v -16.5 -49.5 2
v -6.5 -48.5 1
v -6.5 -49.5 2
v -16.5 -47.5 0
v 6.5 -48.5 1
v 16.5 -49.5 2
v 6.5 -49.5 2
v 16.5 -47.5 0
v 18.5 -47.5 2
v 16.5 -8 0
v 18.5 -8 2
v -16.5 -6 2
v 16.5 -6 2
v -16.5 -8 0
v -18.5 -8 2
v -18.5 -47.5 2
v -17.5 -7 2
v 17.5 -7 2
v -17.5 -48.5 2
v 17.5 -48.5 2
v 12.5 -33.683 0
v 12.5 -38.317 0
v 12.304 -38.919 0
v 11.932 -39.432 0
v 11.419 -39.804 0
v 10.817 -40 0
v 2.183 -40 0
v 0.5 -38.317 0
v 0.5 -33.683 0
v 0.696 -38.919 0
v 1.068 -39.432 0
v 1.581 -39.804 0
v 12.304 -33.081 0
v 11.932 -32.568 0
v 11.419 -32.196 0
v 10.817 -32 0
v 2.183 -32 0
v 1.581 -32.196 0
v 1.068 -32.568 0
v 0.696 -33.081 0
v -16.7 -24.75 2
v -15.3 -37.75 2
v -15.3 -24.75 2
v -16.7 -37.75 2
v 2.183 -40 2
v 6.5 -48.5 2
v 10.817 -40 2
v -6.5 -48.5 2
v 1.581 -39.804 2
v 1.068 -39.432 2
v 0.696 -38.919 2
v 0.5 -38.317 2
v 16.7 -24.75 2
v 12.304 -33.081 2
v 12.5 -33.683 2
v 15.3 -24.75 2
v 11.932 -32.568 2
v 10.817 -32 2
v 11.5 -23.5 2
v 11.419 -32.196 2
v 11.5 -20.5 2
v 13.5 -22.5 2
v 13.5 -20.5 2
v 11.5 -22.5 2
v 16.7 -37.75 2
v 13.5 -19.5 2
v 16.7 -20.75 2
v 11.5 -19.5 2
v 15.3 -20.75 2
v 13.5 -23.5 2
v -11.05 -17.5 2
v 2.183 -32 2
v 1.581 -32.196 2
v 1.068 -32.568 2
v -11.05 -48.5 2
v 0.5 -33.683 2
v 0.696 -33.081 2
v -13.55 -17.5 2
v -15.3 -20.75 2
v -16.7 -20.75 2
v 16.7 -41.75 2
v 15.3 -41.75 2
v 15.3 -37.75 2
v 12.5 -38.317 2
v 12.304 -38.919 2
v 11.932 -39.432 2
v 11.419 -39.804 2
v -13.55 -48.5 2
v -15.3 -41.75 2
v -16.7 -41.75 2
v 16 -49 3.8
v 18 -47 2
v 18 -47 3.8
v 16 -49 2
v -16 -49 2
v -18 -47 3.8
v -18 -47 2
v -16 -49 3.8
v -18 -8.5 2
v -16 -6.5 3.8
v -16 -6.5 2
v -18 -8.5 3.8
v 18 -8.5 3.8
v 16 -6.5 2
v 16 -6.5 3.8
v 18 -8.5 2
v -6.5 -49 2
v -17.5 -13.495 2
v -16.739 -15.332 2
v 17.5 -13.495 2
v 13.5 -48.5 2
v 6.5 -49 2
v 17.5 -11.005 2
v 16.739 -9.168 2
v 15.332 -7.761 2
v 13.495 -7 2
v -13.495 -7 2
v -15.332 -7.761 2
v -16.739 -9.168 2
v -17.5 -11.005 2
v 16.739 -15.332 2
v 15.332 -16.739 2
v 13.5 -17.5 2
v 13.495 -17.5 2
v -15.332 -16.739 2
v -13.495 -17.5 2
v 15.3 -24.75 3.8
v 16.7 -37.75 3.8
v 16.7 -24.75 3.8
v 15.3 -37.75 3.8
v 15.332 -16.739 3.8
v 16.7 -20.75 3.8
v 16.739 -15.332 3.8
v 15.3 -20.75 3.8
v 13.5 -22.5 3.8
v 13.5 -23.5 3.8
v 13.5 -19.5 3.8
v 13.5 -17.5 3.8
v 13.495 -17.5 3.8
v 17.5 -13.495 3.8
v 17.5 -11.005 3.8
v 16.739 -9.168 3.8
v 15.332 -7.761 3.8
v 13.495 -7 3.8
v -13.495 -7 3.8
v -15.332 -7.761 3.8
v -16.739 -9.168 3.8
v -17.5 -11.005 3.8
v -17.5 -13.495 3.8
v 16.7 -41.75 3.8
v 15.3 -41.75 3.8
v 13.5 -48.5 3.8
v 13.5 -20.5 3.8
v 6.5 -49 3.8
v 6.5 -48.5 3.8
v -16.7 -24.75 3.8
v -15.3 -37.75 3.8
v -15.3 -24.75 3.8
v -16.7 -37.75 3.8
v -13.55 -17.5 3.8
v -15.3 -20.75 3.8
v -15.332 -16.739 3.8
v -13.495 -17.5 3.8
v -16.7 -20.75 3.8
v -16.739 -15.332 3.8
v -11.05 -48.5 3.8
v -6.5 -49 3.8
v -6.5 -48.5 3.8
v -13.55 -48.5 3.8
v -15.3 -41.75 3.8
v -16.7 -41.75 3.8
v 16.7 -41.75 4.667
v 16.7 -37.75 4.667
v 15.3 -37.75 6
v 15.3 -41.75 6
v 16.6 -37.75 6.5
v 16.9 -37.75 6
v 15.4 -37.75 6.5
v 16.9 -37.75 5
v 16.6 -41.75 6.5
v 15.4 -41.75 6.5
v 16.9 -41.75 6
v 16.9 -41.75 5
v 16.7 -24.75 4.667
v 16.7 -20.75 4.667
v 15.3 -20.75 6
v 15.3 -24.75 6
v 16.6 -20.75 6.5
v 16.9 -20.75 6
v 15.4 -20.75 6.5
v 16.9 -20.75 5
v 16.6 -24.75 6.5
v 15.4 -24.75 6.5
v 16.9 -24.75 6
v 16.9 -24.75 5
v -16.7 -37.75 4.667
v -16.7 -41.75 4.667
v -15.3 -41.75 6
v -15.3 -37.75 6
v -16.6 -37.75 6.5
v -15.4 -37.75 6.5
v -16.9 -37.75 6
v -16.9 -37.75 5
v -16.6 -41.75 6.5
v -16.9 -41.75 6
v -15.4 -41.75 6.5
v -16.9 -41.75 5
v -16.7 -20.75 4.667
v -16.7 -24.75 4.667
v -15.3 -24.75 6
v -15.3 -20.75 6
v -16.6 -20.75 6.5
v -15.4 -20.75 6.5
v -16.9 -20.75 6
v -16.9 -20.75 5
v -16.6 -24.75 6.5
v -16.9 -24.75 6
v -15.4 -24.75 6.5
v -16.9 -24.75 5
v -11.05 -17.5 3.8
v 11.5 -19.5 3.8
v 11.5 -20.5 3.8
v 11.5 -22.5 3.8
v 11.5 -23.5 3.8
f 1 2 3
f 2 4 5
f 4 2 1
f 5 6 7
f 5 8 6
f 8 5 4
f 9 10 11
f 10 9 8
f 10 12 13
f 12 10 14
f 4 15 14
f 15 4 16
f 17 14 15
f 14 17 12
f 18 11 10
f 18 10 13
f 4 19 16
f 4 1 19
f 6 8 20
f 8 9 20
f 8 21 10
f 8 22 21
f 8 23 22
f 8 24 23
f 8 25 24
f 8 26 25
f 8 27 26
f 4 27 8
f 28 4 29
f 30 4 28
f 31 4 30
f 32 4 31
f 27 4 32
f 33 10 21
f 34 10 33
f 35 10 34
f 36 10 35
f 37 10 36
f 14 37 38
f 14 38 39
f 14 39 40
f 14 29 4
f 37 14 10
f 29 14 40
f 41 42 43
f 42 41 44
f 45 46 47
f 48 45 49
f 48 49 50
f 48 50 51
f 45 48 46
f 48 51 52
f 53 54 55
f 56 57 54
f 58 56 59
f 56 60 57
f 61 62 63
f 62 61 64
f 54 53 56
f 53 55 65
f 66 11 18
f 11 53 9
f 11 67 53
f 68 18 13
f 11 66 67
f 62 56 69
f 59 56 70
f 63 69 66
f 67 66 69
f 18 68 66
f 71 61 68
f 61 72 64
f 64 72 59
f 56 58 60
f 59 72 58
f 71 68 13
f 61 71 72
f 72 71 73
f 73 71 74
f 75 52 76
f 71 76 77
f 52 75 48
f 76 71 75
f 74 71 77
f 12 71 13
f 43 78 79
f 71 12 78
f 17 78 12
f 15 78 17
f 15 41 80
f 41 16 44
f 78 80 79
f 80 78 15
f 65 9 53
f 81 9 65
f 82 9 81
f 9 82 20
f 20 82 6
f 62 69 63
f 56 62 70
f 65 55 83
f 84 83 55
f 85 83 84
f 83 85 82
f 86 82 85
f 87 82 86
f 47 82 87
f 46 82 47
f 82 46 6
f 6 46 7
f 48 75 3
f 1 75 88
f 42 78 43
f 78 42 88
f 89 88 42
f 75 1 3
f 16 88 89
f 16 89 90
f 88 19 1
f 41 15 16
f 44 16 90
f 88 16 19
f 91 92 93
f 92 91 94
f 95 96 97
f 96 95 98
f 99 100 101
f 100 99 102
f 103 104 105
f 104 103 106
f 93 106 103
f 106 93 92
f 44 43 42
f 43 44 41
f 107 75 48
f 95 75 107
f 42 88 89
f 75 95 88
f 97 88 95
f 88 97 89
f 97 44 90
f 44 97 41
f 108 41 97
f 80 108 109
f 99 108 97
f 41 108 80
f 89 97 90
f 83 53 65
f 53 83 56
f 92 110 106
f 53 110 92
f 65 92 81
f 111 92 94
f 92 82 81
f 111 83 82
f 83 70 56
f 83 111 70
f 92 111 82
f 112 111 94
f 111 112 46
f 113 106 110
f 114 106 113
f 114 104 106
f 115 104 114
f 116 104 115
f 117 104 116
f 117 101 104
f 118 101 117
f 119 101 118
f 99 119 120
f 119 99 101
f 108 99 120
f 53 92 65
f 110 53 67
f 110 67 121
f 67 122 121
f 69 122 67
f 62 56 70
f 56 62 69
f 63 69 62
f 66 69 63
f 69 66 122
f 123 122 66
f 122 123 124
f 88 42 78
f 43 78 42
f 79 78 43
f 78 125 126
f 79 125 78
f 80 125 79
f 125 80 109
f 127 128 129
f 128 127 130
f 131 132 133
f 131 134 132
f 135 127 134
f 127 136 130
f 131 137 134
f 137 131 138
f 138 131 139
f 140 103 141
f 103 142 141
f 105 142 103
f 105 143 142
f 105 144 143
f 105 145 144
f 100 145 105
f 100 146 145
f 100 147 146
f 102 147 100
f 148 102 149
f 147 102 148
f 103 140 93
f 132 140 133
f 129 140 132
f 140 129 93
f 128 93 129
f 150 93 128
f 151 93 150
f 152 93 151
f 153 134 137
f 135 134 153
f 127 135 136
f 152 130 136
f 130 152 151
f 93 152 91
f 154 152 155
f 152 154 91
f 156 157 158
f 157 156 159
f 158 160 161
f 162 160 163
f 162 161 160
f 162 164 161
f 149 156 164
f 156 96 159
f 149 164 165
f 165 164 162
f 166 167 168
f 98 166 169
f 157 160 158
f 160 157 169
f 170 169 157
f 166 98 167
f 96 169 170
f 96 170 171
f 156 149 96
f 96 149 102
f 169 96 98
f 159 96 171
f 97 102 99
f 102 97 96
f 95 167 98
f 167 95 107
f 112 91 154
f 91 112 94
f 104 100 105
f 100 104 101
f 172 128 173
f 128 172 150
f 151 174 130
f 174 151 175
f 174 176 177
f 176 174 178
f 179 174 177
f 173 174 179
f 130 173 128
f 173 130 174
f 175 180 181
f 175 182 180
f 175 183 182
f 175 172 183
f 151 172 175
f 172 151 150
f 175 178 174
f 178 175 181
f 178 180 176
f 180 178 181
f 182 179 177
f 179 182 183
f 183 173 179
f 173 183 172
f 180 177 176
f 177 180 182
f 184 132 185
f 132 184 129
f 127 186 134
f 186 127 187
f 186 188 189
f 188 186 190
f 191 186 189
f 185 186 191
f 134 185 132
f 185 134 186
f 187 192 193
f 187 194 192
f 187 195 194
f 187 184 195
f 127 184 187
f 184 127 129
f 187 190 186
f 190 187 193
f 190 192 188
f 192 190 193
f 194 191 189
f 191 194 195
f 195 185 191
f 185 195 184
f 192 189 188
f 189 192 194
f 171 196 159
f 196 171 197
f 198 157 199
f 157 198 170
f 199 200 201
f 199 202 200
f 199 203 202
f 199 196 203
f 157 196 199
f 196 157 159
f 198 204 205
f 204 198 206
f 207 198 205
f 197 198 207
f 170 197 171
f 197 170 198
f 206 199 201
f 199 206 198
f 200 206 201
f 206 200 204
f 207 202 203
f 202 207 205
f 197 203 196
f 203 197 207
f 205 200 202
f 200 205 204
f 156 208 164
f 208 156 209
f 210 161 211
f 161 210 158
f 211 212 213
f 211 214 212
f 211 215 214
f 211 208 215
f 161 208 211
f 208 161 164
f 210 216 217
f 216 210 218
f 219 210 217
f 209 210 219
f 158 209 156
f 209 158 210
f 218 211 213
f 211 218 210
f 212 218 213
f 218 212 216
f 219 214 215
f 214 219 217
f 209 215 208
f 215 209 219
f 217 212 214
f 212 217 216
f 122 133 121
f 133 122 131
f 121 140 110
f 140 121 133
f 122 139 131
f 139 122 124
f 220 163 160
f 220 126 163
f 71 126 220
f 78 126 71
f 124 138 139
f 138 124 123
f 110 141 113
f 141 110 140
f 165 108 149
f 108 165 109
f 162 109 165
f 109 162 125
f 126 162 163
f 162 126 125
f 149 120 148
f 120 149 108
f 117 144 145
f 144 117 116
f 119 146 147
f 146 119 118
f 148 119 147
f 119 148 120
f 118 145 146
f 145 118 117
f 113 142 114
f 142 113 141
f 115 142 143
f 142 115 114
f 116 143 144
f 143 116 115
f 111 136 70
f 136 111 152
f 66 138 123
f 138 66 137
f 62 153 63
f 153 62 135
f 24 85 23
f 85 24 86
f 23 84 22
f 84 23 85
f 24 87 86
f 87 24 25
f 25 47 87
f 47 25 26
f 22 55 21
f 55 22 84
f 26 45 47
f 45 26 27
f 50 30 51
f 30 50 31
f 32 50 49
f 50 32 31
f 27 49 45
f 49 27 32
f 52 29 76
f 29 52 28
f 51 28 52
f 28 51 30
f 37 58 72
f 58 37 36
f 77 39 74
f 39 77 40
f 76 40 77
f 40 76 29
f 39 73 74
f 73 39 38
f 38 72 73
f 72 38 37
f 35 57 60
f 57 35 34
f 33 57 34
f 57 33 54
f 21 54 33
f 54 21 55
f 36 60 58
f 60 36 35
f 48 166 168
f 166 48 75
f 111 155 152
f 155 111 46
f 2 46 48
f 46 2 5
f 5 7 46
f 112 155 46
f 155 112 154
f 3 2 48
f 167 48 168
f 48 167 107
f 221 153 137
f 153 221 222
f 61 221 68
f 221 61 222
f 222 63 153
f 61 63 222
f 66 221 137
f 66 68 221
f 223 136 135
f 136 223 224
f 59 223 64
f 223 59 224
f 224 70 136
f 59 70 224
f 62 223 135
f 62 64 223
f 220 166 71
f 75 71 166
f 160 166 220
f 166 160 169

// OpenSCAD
include <BOSL/constants.scad>
use <BOSL/shapes.scad>
use <BOSL/transforms.scad>
use <JBscad/locks.scad>


module inside(with_hole) {
    module usb_connector() {
        translate([6.5, 16.5, 29-1]) cuboid(
            [12, 8, 10],
            edges=EDGES_Z_ALL,
            fillet=2,
            align=V_TOP,
            $fn=20
        );
    }
    
    module battery() {
        cuboid(
            [35, 10.5, 54],
            edges=EDGES_Z_ALL,
            fillet=5,
            align=V_UP+V_FRONT
        );
    }

    module boards() {
        union() {
            cuboid([27, 29, 29], align=V_UP+V_BACK);
            translate([0, 29, 12]) cuboid([13, 6, 18], align=V_UP+V_BACK);
            ymove(2) cuboid([27, 3, 12], edges=EDGES_Y_ALL, chamfer=2, align=V_BACK);
            usb_connector();
        }
    }
    


    ymove(-1) battery();
    ymove(1) zmove(54-29) boards();
    if (with_hole) {
        color("green") zmove(39) upcube([27, 2, 15]);
    }
    usb_connector();
}

module lid() {
    a=35+4;
    b=10.5+29+2+4;
    
    module locks() {
        translate([16, 12, 0]) xrot(180) lock_small();
        translate([16, -5, 0]) xrot(180) lock_small();
        
        mirror([1,0,0]) {
            translate([16, 12, 0]) xrot(180) lock_small();
            translate([16, -5, 0]) xrot(180) lock_small();
        }
    }
    
    union() {
        difference() {
            zmove(54+2) ymove(b/2) union() {
                difference() {
                    zmove(-1) cuboid(
                        [a, b, 6],
                        chamfer=3,
                        edges=EDGES_TOP+EDGES_Z_ALL
                    );
                    downcube([a+1, b+1, 5]);
                }
                    
                cuboid(
                    [a-3, b-3, 1.8], 
                    align=V_DOWN,
                    edges=EDGES_Z_ALL,
                    chamfer=2
                );
                locks();
            }
            translate([0, +10.5+2+1, 2]) inside(true);
        }
        translate([12.5,15,54+2]) downcube([2,1,1.8]);
        translate([12.5,18,54+2]) downcube([2,1,1.8]);
        color("blue") translate([-12.3,28,54+2]) downcube([2.5,31,1.8]);
    }
    
}

module bottom_case() {
    a=35+4;
    b=10.5+29+2+4;
    
    module lid_spacer() {
        zmove(54+2) ymove(b/2) union() {
            cuboid([a, b, 3], align=V_TOP);
            cuboid(
                [a-2.8, b-2.8, 2], 
                align=V_DOWN,
                edges=EDGES_Z_ALL,
                chamfer=2
            );
        }
    }
    
    module locks() {
        translate([0, b/2, 54]) {
            translate([16, 12, 0]) xrot(180) lock_small_housing();
            translate([16, -5, 0]) xrot(180) lock_small_housing();
            
            mirror([1,0,0]) {
                translate([16, 12, 0]) xrot(180) lock_small_housing();
                translate([16, -5, 0]) xrot(180) lock_small_housing();
            }
        }
    }
    
    difference() {
        color([0,.5,1,.7]) cuboid(
            [a, b, 54+4],
            align=V_TOP+V_BACK,
            chamfer=3
        );
        translate([0, +10.5+2+1, 2]) inside(true);
        lid_spacer();
        locks();
    }

}

//inside();

//ymove(5) bottom_case();
ymove(-5) zmove(54+4) xrot(180) lid();
